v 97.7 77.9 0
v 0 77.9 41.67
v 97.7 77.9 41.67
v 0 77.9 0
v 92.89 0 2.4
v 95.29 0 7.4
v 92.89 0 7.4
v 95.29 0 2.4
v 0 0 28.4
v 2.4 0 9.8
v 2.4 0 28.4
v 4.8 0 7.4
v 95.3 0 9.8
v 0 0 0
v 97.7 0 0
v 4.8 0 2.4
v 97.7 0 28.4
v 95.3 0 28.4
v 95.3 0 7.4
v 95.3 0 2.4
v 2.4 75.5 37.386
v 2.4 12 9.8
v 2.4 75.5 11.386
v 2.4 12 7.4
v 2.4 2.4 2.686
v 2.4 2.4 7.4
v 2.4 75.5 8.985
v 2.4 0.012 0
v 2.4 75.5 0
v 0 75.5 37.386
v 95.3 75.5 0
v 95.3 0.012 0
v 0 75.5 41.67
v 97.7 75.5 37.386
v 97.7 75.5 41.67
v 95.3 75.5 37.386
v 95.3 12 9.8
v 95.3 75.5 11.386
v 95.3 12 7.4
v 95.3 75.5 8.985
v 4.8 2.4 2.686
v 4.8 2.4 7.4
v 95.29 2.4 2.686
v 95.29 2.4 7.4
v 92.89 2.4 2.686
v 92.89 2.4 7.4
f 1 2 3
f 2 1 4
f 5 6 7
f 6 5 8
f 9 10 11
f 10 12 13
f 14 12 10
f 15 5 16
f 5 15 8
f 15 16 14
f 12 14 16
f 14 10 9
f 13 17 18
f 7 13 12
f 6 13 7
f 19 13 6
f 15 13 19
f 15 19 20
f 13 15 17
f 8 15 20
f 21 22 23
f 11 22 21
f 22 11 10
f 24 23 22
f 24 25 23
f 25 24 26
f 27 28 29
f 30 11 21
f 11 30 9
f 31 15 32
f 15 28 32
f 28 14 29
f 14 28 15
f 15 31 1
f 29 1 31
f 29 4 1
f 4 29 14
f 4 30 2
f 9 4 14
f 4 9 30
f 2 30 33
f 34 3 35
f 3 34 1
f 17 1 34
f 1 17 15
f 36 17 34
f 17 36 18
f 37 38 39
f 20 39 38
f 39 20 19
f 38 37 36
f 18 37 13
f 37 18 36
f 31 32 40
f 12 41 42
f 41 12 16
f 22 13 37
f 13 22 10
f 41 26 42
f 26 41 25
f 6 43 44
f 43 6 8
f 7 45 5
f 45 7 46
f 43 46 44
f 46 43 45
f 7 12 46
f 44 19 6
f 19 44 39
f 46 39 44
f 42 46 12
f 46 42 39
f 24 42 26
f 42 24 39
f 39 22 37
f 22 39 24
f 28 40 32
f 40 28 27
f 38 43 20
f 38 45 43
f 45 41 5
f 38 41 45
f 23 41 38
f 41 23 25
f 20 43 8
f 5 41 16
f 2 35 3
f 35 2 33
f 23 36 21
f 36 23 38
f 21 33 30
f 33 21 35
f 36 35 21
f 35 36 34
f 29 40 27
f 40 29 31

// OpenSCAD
// ============================================================================
//  Lorebox — Scanner Card Catch Tray
//  A 3-wall output jig so trading cards eject, decelerate, and stack neatly
//  in order without flipping or pushing earlier cards out.
//
//  HOW IT WORKS
//    - Side rails keep cards square as they land.
//    - A sloped floor lets each card slide forward and settle flat.
//    - A back wall stops the card (line it with felt/foam to kill bounce).
//    - A low hold-down lip at the mouth stops cards riding up and flipping.
//
//  PRINTING
//    - Orient as modeled (floor down). The hold-down lip is the only overhang;
//      it's short, so most slicers bridge it fine. If yours sags, enable
//      supports just for the lip, or set lip_overhang = 0 to omit it and add a
//      strip of tape/acrylic by hand later.
//    - PLA/PETG, 3 perimeters, 15-20% infill is plenty — this carries no load.
//    - Sand or file the inside floor smooth, or line it with felt; you want
//      cards to slide, not catch.
//
//  TUNING (do this with a foam-board mock first, then transfer numbers here)
//    - Cards bounce back / flip   -> add foam to back wall, or raise back_clear
//    - Cards ride up at the mouth -> lower lip_gap toward 4 mm
//    - Bottom card gets shoved    -> add felt to floor (grip), or raise slope
//    - Cards jam at the mouth     -> raise lip_gap, or pull tray back from slot
// ============================================================================

// ----------------------------------------------------------------------------
//  PRESET — Epson DS-575W (straight path, cards fed LONG-EDGE-FIRST)
//  Epson's guidance for thick media: push the output tray extension IN and let
//  cards eject freely onto the surface below. So this tray sits free on the
//  desk, mouth butted to the scanner front, at desk level (no riser, no hook).
//  Feeding long-edge-first means the LONG edge spans the mouth and the card
//  travels its SHORT dimension — hence the swapped card_w / card_l below.
//  Put rubber feet / Dycem under the tray so eject recoil doesn't push it away.
//
//  If you instead feed SHORT-edge-first, use card_w = 63.5; card_l = 88.9;
// ----------------------------------------------------------------------------

/* [Card size] */
card_w      = 88.9;   // DS-575W long-edge-first: long edge spans the mouth
card_l      = 63.5;   // ...card travels its short dimension. Sleeved? +2-3 mm.

/* [Fit clearances] */
side_clear  = 2.0;    // gap each side of the card (rails)
back_clear  = 12.0;   // extra length past the card before the back wall
                      //   = how far cards travel after fully ejecting

/* [Structure] */
wall        = 2.4;    // wall thickness
floor_th    = 2.4;    // floor thickness (at the thin/front edge)
wall_h      = 26.0;   // side-wall height (hold a tall-ish stack)
back_h      = 30.0;   // back-wall height (a touch taller than the sides)

/* [Slope] */
slope_deg   = 7.0;    // floor tilt downhill, away from the scanner
                      //   higher = cards settle harder against the back wall

/* [Hold-down lip — the anti-flip feature] */
lip_gap     = 5.0;    // clear height under the lip at the mouth
                      //   (cards slide UNDER this; keep it low, ~4-6 mm)
lip_overhang= 12.0;   // how far the lip reaches in over the floor
                      //   keep <= ~1/3 of card_l (set to 0 to omit entirely)
lip_th      = 2.4;    // lip thickness

/* [Optional riser feet — lift the mouth to meet the scanner output] */
// Measure how high the scanner's output slot sits above the desk, subtract the
// tray's own mouth height, and put the difference here. Leave 0 if the tray
// already lines up (e.g. it tucks under the scanner's lip).
riser_h     = 0.0;
riser_w     = 14.0;   // footprint of each foot

/* [Quality] */
$fn = 48;

// ---- Derived -------------------------------------------------------------
inner_w  = card_w + 2*side_clear;          // clear width between rails
inner_l  = card_l + back_clear;            // floor run, mouth -> back wall
outer_w  = inner_w + 2*wall;
outer_l  = inner_l + wall;                 // back wall only (mouth is open)
slope_rise = inner_l * tan(slope_deg);     // back edge sits this much higher

// ==========================================================================
module tray() {
    difference() {
        union() {
            // ---- Sloped floor (a wedge: thin at the mouth, thick at back) --
            // Built as a prism so the top face tilts up toward the back wall.
            hull() {
                // front (mouth) edge — thin
                translate([0, 0, 0])
                    cube([outer_w, wall*0.001 + 0.01, floor_th]);
                // back edge — raised by the slope
                translate([0, outer_l - 0.01, slope_rise])
                    cube([outer_w, 0.01, floor_th]);
            }

            // ---- Side rails (follow the sloped floor) ----------------------
            for (x = [0, outer_w - wall])
                translate([x, 0, 0])
                    side_wall();

            // ---- Back wall -------------------------------------------------
            translate([0, outer_l - wall, 0])
                cube([outer_w, wall, slope_rise + floor_th + back_h]);

            // ---- Hold-down lip at the mouth --------------------------------
            if (lip_overhang > 0) {
                translate([wall, 0, floor_th + lip_gap])
                    cube([inner_w, lip_overhang, lip_th]);
                // little posts connecting lip to the floor at the very corners
                for (x = [wall, outer_w - wall - 0.01])
                    translate([x - (x>wall?wall:0), 0, floor_th])
                        cube([wall, wall, lip_gap + lip_th]);
            }

            // ---- Optional riser feet under the mouth -----------------------
            if (riser_h > 0)
                for (x = [0, outer_w - riser_w])
                    translate([x, 0, -riser_h])
                        cube([riser_w, riser_w, riser_h]);
        }
    }
}

module side_wall() {
    // A wall whose bottom follows the sloped floor and whose top is level-ish.
    hull() {
        cube([wall, 0.01, floor_th + wall_h]);                       // front
        translate([0, outer_l - 0.01, 0])
            cube([wall, 0.01, slope_rise + floor_th + wall_h]);      // back
    }
}

tray();

// --- Quick reference printed to the console on render ---
echo(str("Outer footprint: ", outer_w, " x ", outer_l, " mm"));
echo(str("Back wall total height: ", slope_rise + floor_th + back_h, " mm"));
echo(str("Slope rise over run: ", slope_rise, " mm"));
